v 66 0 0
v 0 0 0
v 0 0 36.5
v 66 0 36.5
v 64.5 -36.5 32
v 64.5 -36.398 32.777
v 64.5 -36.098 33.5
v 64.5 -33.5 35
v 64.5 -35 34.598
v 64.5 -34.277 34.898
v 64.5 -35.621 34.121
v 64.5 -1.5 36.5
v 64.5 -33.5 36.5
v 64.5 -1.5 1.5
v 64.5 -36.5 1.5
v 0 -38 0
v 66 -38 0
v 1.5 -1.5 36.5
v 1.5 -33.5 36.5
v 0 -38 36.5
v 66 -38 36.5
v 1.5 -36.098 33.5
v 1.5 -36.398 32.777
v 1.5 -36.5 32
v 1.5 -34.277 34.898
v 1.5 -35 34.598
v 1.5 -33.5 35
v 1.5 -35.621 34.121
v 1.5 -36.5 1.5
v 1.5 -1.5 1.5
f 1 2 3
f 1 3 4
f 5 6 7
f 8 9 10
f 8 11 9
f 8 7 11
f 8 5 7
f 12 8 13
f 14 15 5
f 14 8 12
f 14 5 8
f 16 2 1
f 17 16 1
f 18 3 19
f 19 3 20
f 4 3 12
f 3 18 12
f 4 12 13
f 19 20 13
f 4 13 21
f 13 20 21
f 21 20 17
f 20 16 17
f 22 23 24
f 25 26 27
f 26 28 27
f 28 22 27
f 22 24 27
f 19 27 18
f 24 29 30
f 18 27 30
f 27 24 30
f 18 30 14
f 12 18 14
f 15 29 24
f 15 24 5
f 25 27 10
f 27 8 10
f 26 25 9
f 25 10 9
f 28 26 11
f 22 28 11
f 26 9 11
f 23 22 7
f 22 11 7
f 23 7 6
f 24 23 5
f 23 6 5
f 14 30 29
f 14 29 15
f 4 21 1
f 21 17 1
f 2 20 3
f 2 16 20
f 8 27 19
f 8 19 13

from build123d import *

# Parameters (mm, degrees)
SKETCH_1_W      = 66
SKETCH_1_H      = 38
EXTRUDE_1_DEPTH = 1.5
SKETCH_2_W      = 66
SKETCH_2_H      = 38
SKETCH_2_W_2    = 63
SKETCH_2_H_2    = 35
EXTRUDE_2_DEPTH = 35
SKETCH_3_W      = 63
SKETCH_3_H      = 1.5
EXTRUDE_3_DEPTH = 3
FILLET_1_R      = 3


with BuildPart() as part:
    # 草图1 → 凸台-拉伸1 (new body)
    with BuildSketch(Plane.XY):
        with Locations((33, -19)):
            Rectangle(SKETCH_1_W, SKETCH_1_H)
    extrude(amount=EXTRUDE_1_DEPTH)

    # 草图2 → 凸台-拉伸2 (add)
    with BuildSketch(Plane.XY.offset(1.5)):
        with Locations((33, -19)):
            Rectangle(SKETCH_2_W, SKETCH_2_H)
        with Locations((33, -19)):
            Rectangle(SKETCH_2_W_2, SKETCH_2_H_2, mode=Mode.SUBTRACT)
    extrude(amount=EXTRUDE_2_DEPTH)

    # 草图3 → 凸台-拉伸3 (add)
    with BuildSketch(Plane(origin=(0, -36.5, 0), x_dir=(1, 0, 0), z_dir=(0, 1, 0))):
        with Locations((33, -35.75)):
            Rectangle(SKETCH_3_W, SKETCH_3_H)
    extrude(amount=EXTRUDE_3_DEPTH)

    # 圆角1
    fillet_1_edges = [part.edges().sort_by_distance(p)[0] for p in [
        (33, -36.5, 35),
    ]]
    fillet(fillet_1_edges, radius=FILLET_1_R - 0.0001)  # a hair under: the kernel refuses the full size


solid = part.part
